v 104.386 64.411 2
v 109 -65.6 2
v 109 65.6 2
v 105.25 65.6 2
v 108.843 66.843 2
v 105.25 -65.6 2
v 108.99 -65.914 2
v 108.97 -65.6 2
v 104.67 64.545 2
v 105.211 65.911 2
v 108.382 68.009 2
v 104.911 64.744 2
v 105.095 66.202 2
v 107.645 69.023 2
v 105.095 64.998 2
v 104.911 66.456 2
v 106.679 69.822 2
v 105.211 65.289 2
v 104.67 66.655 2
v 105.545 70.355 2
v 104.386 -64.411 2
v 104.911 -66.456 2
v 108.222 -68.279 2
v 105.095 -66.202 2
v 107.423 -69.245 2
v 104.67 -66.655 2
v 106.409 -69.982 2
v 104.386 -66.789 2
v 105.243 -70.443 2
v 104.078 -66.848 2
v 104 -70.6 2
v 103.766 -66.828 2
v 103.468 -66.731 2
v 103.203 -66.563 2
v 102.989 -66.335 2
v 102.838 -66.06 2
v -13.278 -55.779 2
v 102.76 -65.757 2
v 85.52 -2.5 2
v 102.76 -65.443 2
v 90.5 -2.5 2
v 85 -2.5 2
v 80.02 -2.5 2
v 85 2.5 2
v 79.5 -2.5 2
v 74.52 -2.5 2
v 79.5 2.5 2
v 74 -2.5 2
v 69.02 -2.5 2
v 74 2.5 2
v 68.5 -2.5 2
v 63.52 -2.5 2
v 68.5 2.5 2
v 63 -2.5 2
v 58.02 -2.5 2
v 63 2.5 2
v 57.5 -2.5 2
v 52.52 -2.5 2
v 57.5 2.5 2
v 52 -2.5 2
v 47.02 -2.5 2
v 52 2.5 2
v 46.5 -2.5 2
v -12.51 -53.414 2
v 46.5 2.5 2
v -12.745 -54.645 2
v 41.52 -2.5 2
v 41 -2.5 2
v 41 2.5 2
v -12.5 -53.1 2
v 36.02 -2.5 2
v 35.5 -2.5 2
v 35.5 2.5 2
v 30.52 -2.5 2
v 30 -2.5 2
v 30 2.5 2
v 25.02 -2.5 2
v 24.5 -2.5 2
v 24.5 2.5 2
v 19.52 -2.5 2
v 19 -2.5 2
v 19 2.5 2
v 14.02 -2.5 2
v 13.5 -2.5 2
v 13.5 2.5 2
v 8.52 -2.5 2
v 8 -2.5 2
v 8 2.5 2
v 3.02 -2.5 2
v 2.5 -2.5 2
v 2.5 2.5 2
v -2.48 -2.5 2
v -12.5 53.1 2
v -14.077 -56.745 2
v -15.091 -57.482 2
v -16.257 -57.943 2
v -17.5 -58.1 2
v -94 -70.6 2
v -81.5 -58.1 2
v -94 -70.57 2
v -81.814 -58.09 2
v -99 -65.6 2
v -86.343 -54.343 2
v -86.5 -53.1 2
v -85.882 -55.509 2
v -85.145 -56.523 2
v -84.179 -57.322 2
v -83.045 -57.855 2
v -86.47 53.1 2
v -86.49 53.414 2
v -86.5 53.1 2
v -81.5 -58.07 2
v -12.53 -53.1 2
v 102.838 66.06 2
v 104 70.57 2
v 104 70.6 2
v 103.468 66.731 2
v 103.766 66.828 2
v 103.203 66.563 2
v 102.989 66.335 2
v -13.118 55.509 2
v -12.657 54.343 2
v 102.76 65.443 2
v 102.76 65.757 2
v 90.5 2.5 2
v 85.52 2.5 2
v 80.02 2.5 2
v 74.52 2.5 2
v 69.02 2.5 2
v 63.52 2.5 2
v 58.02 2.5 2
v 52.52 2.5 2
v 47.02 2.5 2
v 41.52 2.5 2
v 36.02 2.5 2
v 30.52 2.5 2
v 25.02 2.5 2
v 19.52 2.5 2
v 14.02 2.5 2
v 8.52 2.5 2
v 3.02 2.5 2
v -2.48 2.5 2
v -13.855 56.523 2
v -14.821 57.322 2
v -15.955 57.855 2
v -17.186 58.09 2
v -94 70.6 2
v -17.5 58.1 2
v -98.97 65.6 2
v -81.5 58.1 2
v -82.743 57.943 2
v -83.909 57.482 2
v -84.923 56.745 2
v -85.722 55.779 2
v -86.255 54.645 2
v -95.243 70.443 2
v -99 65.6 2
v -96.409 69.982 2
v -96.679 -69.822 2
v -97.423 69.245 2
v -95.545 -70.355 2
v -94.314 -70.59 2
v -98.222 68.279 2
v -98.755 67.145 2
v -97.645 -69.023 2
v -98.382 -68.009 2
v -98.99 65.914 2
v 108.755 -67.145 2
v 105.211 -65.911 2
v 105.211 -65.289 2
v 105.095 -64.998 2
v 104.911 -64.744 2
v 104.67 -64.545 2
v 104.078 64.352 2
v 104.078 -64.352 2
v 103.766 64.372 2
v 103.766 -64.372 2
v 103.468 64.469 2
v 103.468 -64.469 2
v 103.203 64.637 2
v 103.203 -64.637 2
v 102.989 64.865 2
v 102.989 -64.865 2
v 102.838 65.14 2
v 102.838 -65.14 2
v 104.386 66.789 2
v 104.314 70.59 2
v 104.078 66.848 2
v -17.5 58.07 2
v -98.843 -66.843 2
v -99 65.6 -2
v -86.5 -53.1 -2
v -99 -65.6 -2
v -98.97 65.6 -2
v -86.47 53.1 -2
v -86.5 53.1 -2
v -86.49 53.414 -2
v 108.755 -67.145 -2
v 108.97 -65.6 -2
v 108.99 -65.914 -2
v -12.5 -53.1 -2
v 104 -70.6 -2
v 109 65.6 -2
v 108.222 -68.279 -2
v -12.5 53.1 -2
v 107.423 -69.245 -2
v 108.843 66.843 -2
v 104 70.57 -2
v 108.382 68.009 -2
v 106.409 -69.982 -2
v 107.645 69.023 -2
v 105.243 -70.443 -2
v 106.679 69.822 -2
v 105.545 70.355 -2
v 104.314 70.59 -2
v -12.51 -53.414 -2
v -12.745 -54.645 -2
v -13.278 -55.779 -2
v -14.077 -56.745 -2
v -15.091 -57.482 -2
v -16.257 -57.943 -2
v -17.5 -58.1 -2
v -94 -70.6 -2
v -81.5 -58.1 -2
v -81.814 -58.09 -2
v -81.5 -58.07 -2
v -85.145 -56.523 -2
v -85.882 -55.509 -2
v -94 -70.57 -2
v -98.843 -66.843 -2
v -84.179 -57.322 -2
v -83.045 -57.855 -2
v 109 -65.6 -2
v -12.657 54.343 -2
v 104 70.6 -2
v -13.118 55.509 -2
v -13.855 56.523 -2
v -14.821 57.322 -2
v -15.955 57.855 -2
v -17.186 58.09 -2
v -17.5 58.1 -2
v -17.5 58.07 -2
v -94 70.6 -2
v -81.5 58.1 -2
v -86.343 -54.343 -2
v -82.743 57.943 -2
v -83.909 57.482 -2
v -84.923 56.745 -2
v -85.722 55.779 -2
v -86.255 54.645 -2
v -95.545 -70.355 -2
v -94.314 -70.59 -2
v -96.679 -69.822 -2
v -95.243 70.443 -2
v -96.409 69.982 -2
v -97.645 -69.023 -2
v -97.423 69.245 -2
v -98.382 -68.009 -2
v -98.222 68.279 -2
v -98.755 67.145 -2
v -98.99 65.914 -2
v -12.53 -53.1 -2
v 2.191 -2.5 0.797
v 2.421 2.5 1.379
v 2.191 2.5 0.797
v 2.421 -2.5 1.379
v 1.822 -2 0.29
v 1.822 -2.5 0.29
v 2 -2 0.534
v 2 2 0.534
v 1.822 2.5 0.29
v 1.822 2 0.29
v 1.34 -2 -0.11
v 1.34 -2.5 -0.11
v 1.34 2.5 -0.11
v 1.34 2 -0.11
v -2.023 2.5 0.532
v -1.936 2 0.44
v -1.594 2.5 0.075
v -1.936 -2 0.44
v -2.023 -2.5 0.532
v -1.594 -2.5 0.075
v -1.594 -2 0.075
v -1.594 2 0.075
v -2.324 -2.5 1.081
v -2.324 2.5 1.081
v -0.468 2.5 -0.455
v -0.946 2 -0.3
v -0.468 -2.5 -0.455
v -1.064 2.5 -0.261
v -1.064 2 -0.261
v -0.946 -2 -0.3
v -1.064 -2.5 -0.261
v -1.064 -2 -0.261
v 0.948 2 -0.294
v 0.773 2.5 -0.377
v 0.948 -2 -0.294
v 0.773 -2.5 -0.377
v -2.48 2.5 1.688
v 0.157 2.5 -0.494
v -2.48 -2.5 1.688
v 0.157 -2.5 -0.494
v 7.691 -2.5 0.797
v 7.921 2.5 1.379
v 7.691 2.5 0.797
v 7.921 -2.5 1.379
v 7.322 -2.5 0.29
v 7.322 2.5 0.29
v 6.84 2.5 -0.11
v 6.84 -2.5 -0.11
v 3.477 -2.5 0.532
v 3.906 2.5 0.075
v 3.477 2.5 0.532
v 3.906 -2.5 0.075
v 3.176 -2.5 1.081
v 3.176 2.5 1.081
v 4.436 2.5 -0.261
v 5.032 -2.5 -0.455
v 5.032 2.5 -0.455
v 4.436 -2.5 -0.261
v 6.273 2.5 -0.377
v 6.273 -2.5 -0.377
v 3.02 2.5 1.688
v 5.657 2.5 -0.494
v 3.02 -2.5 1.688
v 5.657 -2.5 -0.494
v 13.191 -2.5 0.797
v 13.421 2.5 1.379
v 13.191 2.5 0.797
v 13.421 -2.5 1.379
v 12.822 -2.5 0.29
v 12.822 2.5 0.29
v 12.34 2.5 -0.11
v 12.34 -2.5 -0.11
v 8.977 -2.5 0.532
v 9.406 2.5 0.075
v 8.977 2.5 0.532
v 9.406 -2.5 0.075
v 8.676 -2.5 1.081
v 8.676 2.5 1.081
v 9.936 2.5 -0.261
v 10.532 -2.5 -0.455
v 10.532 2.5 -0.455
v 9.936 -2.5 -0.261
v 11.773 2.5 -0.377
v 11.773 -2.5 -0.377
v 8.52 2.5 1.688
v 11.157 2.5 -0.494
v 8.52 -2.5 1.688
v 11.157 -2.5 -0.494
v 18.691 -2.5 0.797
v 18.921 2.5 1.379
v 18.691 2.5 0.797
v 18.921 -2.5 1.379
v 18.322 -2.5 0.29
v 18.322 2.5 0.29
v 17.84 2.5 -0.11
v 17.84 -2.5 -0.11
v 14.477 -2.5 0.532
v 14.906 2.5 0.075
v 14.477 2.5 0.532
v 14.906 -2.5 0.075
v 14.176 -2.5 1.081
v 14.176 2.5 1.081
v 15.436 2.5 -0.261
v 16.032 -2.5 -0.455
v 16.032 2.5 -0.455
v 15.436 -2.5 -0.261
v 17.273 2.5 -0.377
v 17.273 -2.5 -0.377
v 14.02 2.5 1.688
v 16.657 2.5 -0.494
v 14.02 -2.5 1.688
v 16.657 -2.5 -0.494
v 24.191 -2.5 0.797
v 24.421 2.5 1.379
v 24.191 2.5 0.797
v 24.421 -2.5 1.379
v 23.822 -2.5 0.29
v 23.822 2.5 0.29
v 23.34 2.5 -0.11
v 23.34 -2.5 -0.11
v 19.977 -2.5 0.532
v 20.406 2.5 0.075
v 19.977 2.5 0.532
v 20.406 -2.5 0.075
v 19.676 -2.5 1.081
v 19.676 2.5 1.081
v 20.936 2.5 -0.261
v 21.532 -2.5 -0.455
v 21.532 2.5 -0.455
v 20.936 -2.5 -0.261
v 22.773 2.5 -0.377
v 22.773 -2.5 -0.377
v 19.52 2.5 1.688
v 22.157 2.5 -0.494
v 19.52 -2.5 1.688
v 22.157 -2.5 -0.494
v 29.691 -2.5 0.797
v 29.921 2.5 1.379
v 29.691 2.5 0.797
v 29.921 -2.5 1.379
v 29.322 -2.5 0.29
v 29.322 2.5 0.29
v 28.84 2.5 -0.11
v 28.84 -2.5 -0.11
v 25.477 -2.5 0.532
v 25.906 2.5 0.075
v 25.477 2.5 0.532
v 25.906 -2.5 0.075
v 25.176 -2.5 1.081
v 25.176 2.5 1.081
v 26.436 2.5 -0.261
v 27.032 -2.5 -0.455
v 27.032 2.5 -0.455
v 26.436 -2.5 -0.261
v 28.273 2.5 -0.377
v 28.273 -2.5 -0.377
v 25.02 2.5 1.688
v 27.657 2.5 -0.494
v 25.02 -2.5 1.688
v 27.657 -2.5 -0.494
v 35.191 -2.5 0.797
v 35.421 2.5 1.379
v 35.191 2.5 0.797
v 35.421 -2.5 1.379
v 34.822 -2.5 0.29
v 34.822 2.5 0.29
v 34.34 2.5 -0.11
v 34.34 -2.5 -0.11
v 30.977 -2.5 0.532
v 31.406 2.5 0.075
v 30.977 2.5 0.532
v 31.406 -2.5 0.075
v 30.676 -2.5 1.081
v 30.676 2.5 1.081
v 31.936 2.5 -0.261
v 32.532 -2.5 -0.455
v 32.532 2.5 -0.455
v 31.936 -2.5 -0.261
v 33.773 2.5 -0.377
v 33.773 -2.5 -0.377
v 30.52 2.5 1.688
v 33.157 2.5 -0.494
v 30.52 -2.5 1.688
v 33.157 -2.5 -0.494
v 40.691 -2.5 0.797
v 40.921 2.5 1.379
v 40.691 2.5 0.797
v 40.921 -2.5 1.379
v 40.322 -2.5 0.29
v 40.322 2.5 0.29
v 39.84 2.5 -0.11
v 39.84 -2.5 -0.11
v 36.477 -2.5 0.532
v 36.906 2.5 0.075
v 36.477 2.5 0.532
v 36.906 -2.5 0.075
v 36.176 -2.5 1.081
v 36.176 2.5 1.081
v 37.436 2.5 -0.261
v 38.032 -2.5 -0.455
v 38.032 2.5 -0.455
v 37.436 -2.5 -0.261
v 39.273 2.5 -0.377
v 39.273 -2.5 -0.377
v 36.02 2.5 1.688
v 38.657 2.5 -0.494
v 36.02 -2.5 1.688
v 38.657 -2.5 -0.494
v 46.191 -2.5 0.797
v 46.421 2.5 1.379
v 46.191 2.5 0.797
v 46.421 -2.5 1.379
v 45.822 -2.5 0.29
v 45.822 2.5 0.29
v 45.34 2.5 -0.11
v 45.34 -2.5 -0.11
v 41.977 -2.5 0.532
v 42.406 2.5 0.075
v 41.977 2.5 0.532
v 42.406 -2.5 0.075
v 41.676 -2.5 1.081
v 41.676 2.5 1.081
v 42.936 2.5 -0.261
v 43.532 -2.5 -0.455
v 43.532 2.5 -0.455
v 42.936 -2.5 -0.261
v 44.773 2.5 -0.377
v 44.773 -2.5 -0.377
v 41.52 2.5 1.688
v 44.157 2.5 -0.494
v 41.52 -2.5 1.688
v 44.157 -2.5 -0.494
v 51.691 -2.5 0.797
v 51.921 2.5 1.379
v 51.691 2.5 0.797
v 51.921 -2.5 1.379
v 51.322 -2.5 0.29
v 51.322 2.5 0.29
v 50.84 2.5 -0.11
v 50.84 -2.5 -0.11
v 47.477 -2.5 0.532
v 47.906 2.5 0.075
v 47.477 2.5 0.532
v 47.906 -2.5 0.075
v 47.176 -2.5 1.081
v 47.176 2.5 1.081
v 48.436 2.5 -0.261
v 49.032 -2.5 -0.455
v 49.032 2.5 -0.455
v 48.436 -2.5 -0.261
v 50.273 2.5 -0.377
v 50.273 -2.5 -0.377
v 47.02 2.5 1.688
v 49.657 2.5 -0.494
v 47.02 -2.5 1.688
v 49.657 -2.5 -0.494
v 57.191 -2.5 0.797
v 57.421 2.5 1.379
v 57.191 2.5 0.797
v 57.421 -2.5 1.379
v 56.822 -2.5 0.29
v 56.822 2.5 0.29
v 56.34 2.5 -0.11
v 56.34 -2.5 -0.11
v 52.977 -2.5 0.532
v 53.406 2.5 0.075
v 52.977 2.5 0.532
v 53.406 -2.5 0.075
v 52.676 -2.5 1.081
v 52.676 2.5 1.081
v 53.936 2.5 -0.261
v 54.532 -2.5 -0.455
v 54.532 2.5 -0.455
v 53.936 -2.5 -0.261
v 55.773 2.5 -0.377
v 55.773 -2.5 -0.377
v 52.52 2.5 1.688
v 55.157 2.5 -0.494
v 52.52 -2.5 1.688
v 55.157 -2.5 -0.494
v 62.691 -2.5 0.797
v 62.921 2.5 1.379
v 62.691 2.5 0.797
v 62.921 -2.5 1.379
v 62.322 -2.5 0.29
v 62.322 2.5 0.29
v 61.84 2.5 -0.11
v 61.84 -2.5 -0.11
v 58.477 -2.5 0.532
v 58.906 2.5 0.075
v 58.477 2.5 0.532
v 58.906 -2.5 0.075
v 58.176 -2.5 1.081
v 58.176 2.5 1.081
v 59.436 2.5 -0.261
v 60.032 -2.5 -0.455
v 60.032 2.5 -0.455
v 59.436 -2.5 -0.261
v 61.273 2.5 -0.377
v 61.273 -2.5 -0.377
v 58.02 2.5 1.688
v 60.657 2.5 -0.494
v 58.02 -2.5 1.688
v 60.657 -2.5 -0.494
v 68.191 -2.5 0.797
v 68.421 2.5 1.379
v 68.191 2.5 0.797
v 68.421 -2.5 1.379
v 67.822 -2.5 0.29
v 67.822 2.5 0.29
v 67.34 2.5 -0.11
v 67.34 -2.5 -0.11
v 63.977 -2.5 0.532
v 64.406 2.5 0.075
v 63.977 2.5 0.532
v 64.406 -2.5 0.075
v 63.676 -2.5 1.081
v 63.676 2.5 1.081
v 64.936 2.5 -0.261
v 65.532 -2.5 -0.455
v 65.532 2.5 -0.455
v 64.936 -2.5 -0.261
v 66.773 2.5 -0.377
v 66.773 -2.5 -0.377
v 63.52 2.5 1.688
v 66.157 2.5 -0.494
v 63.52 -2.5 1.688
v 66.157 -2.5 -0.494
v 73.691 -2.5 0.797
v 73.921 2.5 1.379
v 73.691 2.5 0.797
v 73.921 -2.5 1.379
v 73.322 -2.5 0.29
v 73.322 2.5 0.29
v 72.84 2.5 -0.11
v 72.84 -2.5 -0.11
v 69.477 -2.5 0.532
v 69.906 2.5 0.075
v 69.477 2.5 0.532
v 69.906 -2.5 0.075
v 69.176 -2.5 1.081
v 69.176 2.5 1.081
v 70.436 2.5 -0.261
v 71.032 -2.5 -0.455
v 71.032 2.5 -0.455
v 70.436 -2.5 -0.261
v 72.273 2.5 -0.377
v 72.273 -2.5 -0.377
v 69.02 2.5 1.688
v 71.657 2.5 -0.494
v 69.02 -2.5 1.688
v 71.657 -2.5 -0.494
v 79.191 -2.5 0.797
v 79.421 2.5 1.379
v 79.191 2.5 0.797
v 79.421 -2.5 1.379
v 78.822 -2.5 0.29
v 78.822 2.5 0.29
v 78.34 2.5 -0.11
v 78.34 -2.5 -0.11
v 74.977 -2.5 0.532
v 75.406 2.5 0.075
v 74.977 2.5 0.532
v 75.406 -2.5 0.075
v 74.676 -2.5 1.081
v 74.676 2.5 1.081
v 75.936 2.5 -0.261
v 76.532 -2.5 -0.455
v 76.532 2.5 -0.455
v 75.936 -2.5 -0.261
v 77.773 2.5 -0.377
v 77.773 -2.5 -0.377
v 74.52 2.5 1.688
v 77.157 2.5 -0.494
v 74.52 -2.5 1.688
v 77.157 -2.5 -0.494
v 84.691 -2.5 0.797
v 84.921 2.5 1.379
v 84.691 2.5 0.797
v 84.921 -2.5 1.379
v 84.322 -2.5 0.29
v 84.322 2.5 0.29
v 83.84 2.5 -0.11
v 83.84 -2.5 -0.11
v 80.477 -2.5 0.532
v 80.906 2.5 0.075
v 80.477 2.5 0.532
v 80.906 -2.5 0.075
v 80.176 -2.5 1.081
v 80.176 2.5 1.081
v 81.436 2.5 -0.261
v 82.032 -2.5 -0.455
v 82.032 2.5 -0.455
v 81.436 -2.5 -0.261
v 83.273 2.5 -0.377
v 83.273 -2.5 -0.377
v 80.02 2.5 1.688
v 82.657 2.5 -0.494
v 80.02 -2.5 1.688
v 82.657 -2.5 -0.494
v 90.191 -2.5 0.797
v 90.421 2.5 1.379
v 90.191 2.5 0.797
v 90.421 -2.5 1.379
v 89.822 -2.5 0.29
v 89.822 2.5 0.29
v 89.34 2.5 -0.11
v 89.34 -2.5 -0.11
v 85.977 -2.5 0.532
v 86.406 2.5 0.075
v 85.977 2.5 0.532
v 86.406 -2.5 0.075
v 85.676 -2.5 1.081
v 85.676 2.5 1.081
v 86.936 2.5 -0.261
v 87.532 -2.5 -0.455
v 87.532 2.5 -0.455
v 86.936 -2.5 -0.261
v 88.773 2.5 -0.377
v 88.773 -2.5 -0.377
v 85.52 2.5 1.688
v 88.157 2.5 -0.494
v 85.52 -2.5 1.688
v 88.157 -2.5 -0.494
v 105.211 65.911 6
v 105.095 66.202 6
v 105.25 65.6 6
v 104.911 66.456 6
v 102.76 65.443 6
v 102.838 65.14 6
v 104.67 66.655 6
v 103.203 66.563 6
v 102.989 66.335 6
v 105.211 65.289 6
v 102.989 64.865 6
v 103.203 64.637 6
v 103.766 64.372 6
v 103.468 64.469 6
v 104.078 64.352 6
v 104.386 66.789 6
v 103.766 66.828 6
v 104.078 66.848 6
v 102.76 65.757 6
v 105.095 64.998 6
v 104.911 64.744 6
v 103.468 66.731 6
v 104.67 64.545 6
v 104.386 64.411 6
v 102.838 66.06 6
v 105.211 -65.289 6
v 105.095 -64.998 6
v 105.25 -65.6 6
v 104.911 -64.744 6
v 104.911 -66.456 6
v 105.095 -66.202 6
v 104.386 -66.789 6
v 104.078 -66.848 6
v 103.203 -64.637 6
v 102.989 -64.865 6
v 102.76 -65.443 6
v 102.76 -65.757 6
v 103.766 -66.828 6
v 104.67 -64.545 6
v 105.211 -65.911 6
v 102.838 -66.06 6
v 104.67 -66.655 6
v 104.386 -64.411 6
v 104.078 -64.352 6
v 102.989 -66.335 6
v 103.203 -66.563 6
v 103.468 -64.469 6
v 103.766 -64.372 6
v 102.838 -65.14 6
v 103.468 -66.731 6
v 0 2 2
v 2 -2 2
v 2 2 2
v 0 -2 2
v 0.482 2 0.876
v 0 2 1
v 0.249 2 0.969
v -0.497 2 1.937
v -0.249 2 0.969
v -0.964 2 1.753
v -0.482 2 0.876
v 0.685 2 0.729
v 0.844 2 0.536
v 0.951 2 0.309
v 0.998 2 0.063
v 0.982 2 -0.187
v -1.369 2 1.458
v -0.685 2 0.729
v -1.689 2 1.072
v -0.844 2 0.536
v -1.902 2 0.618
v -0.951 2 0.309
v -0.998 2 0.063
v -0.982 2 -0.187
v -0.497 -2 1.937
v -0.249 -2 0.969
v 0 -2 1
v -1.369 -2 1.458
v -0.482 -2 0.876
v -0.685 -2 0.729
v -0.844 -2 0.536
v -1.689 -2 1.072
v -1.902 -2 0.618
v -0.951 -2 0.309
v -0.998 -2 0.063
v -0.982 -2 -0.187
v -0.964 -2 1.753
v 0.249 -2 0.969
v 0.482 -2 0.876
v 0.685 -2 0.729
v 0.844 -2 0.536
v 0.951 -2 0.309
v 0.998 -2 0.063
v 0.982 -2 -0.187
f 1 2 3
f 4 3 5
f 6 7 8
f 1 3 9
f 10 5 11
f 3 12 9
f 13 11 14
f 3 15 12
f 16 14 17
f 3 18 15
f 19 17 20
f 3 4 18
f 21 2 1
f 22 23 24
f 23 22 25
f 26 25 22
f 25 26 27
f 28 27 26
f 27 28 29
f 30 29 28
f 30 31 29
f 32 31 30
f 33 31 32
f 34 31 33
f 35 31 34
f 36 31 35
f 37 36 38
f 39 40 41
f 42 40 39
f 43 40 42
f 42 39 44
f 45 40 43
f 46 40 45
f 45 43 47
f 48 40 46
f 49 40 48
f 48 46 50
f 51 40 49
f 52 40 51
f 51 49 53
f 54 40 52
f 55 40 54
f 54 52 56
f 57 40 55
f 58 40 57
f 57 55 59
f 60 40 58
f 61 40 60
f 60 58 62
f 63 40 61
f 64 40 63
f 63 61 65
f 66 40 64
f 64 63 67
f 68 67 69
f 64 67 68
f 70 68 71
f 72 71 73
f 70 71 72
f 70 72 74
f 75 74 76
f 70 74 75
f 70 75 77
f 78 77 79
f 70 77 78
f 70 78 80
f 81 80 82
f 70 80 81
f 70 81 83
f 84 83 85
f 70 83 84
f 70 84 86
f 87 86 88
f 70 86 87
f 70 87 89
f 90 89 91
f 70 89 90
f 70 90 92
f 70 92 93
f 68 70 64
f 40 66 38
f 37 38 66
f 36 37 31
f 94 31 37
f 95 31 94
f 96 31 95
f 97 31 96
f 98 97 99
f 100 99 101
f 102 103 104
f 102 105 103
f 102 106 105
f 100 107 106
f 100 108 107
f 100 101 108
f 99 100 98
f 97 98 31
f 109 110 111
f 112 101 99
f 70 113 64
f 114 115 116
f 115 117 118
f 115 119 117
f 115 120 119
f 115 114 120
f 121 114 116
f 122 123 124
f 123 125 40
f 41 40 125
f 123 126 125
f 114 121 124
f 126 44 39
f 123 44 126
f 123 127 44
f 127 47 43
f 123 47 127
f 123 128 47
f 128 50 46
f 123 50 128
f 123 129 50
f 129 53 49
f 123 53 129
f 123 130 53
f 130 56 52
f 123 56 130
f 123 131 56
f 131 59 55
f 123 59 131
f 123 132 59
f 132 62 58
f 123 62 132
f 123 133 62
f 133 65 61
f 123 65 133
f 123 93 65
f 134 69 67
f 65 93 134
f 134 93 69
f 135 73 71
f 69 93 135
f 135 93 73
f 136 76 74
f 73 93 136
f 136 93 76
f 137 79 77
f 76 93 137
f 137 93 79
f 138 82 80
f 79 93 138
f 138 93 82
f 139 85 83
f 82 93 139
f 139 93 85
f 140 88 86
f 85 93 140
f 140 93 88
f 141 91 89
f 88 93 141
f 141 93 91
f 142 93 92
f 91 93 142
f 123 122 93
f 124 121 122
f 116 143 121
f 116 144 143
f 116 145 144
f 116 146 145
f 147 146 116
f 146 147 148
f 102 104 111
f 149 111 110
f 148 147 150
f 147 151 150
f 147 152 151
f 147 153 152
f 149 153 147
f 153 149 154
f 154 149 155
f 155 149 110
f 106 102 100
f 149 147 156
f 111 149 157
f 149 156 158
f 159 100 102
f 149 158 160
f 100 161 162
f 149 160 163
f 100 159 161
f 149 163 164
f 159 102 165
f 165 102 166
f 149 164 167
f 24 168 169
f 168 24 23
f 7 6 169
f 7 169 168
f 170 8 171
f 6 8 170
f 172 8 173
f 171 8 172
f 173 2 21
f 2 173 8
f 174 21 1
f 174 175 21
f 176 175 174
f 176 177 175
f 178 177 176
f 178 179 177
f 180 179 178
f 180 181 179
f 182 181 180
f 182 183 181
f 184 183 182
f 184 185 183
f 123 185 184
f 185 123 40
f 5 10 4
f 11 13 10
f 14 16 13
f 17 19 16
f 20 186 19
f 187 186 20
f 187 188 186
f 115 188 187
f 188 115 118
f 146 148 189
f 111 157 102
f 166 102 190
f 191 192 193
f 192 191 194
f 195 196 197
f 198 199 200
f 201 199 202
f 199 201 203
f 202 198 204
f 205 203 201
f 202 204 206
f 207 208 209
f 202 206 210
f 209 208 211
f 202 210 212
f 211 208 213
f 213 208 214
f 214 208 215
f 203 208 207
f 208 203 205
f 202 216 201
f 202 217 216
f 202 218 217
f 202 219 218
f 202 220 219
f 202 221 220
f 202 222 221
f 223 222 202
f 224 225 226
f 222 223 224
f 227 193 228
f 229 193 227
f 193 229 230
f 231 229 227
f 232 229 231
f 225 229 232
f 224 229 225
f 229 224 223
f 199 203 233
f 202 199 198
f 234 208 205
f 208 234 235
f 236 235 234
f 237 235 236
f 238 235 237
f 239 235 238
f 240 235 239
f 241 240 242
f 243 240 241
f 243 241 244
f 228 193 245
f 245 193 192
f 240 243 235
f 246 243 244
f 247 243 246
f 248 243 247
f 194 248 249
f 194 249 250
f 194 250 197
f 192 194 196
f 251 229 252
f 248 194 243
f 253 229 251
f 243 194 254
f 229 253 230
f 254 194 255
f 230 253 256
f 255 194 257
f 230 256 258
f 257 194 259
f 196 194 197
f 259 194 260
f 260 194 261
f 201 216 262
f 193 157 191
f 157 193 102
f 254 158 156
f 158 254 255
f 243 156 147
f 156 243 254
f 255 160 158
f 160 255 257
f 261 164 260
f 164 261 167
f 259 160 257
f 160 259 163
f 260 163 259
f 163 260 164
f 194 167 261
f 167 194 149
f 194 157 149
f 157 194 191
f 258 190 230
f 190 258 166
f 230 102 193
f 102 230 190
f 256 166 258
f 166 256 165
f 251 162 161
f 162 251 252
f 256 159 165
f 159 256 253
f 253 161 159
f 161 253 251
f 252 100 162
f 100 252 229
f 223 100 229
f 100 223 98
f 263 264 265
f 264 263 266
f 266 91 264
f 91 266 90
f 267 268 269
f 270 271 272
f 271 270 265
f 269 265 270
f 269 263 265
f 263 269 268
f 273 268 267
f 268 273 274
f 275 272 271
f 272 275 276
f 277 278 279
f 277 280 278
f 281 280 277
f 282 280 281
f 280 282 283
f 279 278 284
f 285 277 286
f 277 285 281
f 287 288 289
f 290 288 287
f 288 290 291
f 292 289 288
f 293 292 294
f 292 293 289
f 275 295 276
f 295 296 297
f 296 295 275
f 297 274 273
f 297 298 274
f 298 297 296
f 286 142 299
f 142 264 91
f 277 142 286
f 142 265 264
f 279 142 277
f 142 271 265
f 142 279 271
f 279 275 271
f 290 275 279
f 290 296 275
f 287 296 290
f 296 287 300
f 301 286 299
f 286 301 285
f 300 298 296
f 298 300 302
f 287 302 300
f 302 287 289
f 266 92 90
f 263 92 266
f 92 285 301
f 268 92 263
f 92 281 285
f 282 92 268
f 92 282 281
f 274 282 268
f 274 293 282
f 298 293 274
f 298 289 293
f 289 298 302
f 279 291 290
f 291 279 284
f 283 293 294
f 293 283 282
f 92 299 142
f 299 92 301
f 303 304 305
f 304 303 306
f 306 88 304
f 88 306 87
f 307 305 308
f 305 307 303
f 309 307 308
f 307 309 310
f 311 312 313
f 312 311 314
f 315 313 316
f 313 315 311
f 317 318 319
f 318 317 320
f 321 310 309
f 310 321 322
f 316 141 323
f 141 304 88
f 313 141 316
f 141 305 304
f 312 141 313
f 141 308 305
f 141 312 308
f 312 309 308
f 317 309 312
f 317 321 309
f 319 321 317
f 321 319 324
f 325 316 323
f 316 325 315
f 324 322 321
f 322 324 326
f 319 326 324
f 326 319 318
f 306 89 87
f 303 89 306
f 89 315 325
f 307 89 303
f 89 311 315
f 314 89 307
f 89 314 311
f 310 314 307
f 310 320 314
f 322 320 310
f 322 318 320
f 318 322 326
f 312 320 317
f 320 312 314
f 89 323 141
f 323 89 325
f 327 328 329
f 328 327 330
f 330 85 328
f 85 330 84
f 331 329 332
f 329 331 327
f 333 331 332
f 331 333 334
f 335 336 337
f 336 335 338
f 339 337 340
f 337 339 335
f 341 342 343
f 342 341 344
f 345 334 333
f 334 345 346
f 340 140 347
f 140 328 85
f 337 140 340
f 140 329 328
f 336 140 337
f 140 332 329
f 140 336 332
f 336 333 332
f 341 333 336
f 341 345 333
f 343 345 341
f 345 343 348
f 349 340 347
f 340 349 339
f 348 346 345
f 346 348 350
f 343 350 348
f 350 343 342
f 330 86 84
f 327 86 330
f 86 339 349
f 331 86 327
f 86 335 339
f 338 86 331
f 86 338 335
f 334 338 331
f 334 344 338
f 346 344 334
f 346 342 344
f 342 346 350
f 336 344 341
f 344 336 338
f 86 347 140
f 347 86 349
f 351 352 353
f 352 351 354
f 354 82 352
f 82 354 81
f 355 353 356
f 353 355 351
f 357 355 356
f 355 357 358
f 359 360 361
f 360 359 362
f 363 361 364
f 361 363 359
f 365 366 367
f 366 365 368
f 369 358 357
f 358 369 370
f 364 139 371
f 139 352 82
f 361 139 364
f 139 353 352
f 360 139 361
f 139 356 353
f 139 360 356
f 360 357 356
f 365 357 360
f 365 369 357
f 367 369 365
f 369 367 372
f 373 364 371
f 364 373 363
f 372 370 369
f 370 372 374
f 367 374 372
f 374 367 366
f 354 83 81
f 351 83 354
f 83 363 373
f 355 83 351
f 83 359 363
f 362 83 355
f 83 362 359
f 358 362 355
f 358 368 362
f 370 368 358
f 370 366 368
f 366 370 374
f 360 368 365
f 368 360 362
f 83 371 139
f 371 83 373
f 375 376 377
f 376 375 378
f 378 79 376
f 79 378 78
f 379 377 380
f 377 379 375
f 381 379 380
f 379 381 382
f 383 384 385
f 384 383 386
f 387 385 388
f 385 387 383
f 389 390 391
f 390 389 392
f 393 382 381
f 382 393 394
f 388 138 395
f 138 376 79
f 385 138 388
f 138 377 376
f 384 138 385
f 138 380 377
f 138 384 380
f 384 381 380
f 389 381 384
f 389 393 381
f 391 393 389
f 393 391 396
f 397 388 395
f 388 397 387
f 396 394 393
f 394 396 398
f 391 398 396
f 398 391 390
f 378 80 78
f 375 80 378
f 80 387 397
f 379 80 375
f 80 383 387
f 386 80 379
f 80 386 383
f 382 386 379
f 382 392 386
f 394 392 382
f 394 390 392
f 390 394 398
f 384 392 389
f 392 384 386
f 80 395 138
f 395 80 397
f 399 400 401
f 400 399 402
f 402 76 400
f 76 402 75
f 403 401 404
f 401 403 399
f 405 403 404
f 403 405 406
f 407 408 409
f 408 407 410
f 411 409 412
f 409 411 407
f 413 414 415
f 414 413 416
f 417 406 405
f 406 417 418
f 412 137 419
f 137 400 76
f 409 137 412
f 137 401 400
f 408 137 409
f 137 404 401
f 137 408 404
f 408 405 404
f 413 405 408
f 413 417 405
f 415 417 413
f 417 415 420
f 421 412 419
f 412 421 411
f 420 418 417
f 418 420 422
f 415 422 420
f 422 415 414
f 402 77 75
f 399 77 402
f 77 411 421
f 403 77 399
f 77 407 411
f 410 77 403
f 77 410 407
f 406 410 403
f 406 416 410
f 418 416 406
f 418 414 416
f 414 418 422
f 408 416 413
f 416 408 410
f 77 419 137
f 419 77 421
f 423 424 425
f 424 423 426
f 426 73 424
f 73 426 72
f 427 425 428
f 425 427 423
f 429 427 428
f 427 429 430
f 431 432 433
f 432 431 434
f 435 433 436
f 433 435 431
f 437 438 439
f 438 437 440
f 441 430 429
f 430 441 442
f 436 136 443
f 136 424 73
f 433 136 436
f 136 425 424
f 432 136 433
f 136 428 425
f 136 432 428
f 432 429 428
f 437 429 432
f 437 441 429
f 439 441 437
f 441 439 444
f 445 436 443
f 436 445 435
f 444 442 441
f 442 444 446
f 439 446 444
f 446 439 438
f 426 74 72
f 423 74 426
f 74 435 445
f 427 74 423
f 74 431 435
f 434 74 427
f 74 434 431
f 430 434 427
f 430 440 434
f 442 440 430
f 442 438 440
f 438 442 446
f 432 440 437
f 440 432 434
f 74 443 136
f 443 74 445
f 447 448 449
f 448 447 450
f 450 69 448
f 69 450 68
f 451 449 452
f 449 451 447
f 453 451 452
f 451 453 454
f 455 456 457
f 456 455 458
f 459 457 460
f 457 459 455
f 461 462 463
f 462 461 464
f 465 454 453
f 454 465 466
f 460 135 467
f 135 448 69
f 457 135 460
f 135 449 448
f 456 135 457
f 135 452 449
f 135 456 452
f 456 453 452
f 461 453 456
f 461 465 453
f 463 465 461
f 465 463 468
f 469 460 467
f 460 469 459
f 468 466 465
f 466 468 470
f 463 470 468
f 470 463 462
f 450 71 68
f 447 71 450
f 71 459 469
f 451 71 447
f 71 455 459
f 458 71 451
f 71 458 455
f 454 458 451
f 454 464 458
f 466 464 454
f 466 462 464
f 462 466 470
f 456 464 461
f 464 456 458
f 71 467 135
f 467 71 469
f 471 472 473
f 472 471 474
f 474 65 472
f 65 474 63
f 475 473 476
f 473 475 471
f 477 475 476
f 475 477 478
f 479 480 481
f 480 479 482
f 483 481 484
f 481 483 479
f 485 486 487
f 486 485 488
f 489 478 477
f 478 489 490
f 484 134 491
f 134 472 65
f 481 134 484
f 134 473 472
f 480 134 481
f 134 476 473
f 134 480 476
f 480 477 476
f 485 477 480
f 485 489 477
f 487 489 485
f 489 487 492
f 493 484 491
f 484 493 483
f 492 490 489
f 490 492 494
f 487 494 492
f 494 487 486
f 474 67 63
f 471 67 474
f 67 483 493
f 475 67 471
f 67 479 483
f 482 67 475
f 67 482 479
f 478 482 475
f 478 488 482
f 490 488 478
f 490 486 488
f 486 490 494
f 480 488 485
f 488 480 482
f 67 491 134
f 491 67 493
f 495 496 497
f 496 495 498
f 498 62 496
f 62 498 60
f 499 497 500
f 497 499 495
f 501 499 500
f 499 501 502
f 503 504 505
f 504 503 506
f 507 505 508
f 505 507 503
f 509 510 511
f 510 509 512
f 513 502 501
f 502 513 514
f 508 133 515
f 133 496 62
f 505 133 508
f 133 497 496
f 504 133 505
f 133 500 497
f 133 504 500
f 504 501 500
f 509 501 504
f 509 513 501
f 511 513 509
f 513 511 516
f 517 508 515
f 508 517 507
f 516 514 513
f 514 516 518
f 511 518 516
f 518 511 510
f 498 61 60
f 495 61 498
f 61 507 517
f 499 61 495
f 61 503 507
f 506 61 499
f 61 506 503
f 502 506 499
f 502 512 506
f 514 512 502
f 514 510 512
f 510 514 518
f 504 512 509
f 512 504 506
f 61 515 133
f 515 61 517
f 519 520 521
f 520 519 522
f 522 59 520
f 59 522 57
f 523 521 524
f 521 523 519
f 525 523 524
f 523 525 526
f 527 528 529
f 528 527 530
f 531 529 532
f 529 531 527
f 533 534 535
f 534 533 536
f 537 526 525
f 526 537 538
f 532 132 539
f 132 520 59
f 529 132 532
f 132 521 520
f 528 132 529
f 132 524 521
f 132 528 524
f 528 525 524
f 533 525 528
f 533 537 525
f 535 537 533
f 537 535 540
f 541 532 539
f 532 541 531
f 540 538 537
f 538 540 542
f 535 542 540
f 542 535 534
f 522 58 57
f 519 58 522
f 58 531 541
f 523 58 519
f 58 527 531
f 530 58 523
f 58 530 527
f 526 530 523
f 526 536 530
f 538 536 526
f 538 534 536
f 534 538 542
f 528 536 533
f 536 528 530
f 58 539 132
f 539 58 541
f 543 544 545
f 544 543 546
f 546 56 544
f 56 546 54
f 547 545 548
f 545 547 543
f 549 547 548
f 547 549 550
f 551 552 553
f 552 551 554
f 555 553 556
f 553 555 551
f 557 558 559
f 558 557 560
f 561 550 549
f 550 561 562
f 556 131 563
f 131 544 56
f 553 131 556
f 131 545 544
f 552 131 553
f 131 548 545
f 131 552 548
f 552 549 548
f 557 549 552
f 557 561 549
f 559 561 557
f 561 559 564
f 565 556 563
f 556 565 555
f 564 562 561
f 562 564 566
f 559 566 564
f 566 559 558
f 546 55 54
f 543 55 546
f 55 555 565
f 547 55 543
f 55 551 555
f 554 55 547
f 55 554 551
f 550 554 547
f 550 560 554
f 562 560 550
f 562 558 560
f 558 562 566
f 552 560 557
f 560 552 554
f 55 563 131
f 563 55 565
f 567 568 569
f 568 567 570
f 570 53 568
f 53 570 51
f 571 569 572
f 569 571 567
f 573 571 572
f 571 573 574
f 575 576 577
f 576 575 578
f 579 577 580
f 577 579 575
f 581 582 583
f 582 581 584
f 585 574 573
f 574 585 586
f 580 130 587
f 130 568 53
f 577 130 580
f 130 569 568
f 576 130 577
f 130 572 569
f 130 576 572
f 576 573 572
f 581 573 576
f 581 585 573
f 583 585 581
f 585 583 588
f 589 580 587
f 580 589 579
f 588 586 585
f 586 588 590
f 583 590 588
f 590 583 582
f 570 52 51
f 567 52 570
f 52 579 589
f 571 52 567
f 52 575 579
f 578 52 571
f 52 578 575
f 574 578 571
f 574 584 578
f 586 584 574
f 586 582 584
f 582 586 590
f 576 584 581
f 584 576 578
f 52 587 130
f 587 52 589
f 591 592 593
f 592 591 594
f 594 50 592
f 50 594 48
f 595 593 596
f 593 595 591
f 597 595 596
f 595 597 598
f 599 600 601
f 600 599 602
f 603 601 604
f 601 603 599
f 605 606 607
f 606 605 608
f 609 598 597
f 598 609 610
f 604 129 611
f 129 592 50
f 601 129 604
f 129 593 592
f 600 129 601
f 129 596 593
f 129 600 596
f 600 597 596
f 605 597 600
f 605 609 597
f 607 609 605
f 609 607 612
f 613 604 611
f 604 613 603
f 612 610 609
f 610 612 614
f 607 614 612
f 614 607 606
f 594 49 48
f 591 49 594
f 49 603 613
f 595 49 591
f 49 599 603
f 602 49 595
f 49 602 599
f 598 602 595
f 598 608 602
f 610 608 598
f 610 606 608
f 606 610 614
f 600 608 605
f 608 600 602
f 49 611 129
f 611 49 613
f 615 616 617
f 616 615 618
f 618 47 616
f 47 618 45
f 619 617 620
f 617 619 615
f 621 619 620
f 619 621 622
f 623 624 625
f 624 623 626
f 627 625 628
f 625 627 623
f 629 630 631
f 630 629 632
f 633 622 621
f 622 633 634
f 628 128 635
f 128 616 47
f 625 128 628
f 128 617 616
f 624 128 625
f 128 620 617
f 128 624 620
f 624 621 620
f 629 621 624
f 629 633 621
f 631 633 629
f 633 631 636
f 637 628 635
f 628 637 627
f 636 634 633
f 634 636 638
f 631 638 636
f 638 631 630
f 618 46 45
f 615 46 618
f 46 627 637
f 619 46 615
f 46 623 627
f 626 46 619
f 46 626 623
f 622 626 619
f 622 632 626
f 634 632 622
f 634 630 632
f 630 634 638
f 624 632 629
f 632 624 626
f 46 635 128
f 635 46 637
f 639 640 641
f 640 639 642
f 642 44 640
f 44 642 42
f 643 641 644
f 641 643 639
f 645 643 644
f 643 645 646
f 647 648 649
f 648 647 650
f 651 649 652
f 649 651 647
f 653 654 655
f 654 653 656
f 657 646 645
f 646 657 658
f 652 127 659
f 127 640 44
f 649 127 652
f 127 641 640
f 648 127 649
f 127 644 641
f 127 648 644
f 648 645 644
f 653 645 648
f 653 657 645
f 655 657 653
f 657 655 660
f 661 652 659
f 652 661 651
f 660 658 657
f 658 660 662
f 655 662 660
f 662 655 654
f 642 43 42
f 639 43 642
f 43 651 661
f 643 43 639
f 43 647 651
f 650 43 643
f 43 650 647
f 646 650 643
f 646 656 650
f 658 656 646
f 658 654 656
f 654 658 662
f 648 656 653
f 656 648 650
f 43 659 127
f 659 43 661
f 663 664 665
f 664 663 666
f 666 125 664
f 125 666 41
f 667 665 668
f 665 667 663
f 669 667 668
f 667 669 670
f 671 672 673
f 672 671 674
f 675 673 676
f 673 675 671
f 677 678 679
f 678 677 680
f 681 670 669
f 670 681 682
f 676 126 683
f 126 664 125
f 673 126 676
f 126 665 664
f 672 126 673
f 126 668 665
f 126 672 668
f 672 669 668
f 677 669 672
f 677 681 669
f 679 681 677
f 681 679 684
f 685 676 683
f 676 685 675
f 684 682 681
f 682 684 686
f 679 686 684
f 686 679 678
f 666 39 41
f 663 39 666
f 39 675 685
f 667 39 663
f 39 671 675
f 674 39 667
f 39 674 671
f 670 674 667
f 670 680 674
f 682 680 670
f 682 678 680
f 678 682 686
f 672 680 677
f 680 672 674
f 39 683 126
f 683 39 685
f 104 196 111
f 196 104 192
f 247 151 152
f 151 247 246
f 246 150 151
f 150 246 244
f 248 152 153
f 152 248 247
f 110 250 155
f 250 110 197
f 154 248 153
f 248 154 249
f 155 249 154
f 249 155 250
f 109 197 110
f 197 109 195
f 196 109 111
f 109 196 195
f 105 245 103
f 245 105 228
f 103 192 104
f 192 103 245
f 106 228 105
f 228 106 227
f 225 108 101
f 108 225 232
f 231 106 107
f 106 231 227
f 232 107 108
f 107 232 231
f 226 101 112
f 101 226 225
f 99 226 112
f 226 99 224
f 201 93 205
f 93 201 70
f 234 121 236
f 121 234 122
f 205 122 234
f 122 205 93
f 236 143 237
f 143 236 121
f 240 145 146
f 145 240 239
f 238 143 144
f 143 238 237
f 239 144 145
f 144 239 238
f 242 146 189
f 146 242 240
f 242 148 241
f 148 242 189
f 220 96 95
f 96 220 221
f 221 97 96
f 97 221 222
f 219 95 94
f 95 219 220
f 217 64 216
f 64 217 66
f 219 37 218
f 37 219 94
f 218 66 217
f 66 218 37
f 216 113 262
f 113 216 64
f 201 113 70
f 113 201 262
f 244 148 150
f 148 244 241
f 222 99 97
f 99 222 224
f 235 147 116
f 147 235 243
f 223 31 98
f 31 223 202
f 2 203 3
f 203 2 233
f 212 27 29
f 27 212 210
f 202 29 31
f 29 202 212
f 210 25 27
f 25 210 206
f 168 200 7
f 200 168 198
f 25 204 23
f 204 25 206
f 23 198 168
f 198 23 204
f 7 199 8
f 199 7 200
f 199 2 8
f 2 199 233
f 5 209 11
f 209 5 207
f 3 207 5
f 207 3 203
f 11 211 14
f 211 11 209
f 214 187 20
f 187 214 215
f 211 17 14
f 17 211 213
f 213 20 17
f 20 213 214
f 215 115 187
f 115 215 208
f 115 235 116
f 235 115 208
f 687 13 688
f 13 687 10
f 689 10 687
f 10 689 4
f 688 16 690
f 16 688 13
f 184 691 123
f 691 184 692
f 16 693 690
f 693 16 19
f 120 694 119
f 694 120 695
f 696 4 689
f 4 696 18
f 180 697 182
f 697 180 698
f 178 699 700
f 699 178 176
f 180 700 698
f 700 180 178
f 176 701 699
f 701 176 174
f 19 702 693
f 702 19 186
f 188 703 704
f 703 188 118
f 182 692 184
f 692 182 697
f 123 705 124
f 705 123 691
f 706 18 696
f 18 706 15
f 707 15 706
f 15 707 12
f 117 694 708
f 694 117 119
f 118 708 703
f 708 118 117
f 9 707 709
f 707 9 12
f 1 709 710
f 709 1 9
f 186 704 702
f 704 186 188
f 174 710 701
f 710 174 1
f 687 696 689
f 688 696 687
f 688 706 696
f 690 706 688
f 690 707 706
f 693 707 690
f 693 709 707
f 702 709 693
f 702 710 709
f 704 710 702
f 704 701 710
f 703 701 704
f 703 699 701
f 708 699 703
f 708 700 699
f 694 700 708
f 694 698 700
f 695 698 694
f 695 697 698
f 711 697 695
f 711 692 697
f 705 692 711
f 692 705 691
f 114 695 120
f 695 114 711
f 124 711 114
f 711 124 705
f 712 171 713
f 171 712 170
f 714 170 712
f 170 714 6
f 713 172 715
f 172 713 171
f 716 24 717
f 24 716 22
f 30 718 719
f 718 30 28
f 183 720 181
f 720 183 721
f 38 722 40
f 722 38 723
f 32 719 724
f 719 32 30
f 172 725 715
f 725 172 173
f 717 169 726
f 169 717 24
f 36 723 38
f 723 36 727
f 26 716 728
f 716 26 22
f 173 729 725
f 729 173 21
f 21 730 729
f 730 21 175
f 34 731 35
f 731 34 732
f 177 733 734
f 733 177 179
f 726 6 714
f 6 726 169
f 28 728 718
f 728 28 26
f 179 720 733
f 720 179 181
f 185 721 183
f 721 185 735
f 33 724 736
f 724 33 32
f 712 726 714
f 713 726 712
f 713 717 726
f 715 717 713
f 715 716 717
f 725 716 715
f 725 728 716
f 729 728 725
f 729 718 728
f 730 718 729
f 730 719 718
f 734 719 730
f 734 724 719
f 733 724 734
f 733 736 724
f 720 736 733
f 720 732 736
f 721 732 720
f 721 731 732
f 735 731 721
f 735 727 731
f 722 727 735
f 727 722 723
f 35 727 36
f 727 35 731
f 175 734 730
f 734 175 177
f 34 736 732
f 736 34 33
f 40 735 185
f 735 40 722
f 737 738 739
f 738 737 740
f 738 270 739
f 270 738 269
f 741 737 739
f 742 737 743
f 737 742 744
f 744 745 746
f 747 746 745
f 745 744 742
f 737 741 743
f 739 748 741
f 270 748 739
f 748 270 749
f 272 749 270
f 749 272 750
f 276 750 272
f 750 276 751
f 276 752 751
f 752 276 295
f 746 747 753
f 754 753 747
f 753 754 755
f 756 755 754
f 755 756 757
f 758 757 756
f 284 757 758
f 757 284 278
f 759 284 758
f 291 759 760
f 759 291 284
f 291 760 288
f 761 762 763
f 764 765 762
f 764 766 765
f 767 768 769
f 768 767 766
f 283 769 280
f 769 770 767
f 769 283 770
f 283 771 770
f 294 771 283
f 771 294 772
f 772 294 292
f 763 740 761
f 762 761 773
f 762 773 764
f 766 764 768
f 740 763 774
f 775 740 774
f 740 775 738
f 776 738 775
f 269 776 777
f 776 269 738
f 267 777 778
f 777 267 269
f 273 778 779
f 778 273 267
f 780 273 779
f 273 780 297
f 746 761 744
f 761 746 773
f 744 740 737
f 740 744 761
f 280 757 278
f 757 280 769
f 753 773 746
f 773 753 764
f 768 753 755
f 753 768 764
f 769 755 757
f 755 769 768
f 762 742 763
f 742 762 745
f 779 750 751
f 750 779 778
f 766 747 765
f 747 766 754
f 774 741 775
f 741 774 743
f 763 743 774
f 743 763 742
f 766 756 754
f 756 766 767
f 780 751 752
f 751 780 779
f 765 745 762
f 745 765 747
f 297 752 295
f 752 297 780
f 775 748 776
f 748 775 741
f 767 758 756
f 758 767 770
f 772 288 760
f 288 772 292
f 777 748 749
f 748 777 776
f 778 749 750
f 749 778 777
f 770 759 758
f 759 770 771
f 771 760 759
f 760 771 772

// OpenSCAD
// file: ../lib/slot.scad
module slot_cutout(radius) {
    difference() {
        rotate([270, 0, 0]) cylinder(r=radius, h=radius*2, center=true);
        translate([0, 0, radius / 2]) cube([radius * 2, radius * 2, radius], center=true);
    }
}
// file: ../lib/bevel.scad
// Create a cutout for beveling 90 degree edges.
// TODO: Currently only supports bevels along x and y, support z.
module beveled_edge_cutout(pos, depth, radius) {
    // assume 0 invalid and break
    x = pos[0] > 0 ? pos[0] - radius : pos[0] + radius;
    y = pos[1] > 0 ? pos[1] - radius : pos[1] + radius;

    rotation = (pos[0] < 0 && pos[1] < 0) ? 180
        : (pos[0] < 0 && pos[1] > 0) ? 90
        : (pos[0] > 0 && pos[1] < 0) ? 270 : 0;

    translate([x, y, pos[2]]) {
        rotate([0, 0, rotation]) difference() {
            cube([radius * 2, radius * 2, depth], center=true);
            cylinder(r=radius, h=depth, center=true);
            translate([-radius/2, 0, 0])
                cube([radius, radius * 2, depth], center=true);
            translate([0, -radius/2,0])
                cube([radius * 2, radius, depth], center=true);
        }
    }
}
// file: ../components/hinge_bottom.scad
$fn = 25;

module hinge_bottom(size) {
    difference() {
        union() {
            translate([0, 0, size / 2 / 2 * -1]) cube([size, size, size / 2], center=true);
            rotate([90, 0, 0]) cylinder(r=size / 2, h=size, center=true);
        }

        rotate([90, 0, 0]) cylinder(r=size / 2 - 1, h=size, center=true);
    }
}
// file: ../components/board_base.scad
include <../lib/bevel.scad>
include <../lib/slot.scad>

tolerance = 0.001;

module board_base(width, height, depth, bevel_radius, slot_radius, slot_offset) {
    difference() {
        cube([width, height, depth], center=true);

	// Bevel edges
        beveled_edge_cutout([width / 2 * -1, height / 2, 0], depth, bevel_radius);
        beveled_edge_cutout([width / 2 * -1, height / 2 * -1, 0], depth, bevel_radius);

	// Slots
        left_position = height / 2 - slot_offset;
        right_position = left_position * -1;
        rail_length = width / 2;

        // add slot_radius to x so that slots lay solely on one side of the board
        translate([slot_radius, left_position, 0]) rail_cutout(rail_length, slot_radius);
        translate([slot_radius, right_position, 0]) rail_cutout(rail_length, slot_radius);

        // Hollow cutout to reduce plastic use and weight.
        translate([-width / 4, 0, 0])
            hollow_cutout(width / 2, height, depth, 25, bevel_radius);
    }

    // Extension Attachment
    translate([width / 2 + bevel_radius, 0, 0]) attachment_extension(height, depth, bevel_radius);
}

// TODO(jenterkin): split out into separate component
module attachment_extension(height, depth, bevel_radius) {
    width = bevel_radius * 2;

    difference() {
        cube([width, height, depth], center=true);
        beveled_edge_cutout([width / 2, height / 2 * -1, 0], depth, bevel_radius);
        beveled_edge_cutout([width / 2, height / 2, 0], depth, bevel_radius);
    }

    // Attachment posts
    post_position = height / 2 - bevel_radius;
    post_radius = bevel_radius / 4;

    translate([0, post_position, depth / 2]) cylinder(r=post_radius, h=depth);
    translate([0, -post_position, depth / 2]) cylinder(r=post_radius, h=depth);
}

module rail_cutout(length, slot_radius) {
    // The .5 gives a 1mm buffer between slots. Maybe make configurable?
    slot_width = slot_radius * 2 + .5;

    // Set one fewer slot to give some buffer room before the edge.
    num_slots = length / slot_width - 1;

    // Subtracting 1 from num_slots since we're starting at 0.
    for (i=[0:1:num_slots - 1]) {
        // tolerance avoids z-fighting
        translate([i * slot_width, 0, tolerance + depth / 2])
            slot_cutout(slot_radius);
    }
}

module hollow_cutout(width, height, depth, cutout_border, bevel_radius) {
    adj_w = width - cutout_border;
    adj_h = height - cutout_border;

    difference() {
        cube([adj_w, adj_h, depth + 0.1], center=true);
        beveled_edge_cutout([-adj_w / 2, adj_h / 2, 0], depth, bevel_radius);
        beveled_edge_cutout([-adj_w / 2, adj_h / 2 * -1, 0], depth, bevel_radius);
        beveled_edge_cutout([adj_w / 2, adj_h / 2, 0], depth, bevel_radius);
        beveled_edge_cutout([adj_w / 2, adj_h / 2 * -1, 0], depth, bevel_radius);
    }
}
// file: ../values.scad
// keyboard dimensions
inner_width = 190;
inner_height = 133.2;
inner_depth = 25.5;

// board dimensions
depth = 4;
// width and height have a border of 2*depth to allow for walls.
width = inner_width + (depth * 2);
height = inner_height + (depth * 2);

board_bevel_radius = 5;

hinge_offset = 15;

slot_radius = 2.5;
slot_offset = hinge_offset;
// file: ../parts/board_bottom.scad
include <../components/board_base.scad>
include <../components/hinge_bottom.scad>

module hinge(mod, depth, hinge_offset) {
    translate([
        // Place at the -x edge of the board
        -1 * width / 2 - depth / 2,
        // Place on edges with offset towards the center
        mod * height / 2 + mod * -1 * hinge_offset,
        0
    ])
        rotate([0, 270, 0])
	    hinge_bottom(size=depth);
}

module board_bottom(width, height, depth, board_radius, slot_radius, slot_offset, hinge_offset) {
    board_base(width, height, depth, board_radius, slot_radius, slot_offset);
    hinge(-1, depth, hinge_offset);
    hinge(1, depth, hinge_offset);
}
// main file
include <../parts/board_bottom.scad>
include <../values.scad>

board_bottom(width, height, depth, board_bevel_radius, slot_radius);
